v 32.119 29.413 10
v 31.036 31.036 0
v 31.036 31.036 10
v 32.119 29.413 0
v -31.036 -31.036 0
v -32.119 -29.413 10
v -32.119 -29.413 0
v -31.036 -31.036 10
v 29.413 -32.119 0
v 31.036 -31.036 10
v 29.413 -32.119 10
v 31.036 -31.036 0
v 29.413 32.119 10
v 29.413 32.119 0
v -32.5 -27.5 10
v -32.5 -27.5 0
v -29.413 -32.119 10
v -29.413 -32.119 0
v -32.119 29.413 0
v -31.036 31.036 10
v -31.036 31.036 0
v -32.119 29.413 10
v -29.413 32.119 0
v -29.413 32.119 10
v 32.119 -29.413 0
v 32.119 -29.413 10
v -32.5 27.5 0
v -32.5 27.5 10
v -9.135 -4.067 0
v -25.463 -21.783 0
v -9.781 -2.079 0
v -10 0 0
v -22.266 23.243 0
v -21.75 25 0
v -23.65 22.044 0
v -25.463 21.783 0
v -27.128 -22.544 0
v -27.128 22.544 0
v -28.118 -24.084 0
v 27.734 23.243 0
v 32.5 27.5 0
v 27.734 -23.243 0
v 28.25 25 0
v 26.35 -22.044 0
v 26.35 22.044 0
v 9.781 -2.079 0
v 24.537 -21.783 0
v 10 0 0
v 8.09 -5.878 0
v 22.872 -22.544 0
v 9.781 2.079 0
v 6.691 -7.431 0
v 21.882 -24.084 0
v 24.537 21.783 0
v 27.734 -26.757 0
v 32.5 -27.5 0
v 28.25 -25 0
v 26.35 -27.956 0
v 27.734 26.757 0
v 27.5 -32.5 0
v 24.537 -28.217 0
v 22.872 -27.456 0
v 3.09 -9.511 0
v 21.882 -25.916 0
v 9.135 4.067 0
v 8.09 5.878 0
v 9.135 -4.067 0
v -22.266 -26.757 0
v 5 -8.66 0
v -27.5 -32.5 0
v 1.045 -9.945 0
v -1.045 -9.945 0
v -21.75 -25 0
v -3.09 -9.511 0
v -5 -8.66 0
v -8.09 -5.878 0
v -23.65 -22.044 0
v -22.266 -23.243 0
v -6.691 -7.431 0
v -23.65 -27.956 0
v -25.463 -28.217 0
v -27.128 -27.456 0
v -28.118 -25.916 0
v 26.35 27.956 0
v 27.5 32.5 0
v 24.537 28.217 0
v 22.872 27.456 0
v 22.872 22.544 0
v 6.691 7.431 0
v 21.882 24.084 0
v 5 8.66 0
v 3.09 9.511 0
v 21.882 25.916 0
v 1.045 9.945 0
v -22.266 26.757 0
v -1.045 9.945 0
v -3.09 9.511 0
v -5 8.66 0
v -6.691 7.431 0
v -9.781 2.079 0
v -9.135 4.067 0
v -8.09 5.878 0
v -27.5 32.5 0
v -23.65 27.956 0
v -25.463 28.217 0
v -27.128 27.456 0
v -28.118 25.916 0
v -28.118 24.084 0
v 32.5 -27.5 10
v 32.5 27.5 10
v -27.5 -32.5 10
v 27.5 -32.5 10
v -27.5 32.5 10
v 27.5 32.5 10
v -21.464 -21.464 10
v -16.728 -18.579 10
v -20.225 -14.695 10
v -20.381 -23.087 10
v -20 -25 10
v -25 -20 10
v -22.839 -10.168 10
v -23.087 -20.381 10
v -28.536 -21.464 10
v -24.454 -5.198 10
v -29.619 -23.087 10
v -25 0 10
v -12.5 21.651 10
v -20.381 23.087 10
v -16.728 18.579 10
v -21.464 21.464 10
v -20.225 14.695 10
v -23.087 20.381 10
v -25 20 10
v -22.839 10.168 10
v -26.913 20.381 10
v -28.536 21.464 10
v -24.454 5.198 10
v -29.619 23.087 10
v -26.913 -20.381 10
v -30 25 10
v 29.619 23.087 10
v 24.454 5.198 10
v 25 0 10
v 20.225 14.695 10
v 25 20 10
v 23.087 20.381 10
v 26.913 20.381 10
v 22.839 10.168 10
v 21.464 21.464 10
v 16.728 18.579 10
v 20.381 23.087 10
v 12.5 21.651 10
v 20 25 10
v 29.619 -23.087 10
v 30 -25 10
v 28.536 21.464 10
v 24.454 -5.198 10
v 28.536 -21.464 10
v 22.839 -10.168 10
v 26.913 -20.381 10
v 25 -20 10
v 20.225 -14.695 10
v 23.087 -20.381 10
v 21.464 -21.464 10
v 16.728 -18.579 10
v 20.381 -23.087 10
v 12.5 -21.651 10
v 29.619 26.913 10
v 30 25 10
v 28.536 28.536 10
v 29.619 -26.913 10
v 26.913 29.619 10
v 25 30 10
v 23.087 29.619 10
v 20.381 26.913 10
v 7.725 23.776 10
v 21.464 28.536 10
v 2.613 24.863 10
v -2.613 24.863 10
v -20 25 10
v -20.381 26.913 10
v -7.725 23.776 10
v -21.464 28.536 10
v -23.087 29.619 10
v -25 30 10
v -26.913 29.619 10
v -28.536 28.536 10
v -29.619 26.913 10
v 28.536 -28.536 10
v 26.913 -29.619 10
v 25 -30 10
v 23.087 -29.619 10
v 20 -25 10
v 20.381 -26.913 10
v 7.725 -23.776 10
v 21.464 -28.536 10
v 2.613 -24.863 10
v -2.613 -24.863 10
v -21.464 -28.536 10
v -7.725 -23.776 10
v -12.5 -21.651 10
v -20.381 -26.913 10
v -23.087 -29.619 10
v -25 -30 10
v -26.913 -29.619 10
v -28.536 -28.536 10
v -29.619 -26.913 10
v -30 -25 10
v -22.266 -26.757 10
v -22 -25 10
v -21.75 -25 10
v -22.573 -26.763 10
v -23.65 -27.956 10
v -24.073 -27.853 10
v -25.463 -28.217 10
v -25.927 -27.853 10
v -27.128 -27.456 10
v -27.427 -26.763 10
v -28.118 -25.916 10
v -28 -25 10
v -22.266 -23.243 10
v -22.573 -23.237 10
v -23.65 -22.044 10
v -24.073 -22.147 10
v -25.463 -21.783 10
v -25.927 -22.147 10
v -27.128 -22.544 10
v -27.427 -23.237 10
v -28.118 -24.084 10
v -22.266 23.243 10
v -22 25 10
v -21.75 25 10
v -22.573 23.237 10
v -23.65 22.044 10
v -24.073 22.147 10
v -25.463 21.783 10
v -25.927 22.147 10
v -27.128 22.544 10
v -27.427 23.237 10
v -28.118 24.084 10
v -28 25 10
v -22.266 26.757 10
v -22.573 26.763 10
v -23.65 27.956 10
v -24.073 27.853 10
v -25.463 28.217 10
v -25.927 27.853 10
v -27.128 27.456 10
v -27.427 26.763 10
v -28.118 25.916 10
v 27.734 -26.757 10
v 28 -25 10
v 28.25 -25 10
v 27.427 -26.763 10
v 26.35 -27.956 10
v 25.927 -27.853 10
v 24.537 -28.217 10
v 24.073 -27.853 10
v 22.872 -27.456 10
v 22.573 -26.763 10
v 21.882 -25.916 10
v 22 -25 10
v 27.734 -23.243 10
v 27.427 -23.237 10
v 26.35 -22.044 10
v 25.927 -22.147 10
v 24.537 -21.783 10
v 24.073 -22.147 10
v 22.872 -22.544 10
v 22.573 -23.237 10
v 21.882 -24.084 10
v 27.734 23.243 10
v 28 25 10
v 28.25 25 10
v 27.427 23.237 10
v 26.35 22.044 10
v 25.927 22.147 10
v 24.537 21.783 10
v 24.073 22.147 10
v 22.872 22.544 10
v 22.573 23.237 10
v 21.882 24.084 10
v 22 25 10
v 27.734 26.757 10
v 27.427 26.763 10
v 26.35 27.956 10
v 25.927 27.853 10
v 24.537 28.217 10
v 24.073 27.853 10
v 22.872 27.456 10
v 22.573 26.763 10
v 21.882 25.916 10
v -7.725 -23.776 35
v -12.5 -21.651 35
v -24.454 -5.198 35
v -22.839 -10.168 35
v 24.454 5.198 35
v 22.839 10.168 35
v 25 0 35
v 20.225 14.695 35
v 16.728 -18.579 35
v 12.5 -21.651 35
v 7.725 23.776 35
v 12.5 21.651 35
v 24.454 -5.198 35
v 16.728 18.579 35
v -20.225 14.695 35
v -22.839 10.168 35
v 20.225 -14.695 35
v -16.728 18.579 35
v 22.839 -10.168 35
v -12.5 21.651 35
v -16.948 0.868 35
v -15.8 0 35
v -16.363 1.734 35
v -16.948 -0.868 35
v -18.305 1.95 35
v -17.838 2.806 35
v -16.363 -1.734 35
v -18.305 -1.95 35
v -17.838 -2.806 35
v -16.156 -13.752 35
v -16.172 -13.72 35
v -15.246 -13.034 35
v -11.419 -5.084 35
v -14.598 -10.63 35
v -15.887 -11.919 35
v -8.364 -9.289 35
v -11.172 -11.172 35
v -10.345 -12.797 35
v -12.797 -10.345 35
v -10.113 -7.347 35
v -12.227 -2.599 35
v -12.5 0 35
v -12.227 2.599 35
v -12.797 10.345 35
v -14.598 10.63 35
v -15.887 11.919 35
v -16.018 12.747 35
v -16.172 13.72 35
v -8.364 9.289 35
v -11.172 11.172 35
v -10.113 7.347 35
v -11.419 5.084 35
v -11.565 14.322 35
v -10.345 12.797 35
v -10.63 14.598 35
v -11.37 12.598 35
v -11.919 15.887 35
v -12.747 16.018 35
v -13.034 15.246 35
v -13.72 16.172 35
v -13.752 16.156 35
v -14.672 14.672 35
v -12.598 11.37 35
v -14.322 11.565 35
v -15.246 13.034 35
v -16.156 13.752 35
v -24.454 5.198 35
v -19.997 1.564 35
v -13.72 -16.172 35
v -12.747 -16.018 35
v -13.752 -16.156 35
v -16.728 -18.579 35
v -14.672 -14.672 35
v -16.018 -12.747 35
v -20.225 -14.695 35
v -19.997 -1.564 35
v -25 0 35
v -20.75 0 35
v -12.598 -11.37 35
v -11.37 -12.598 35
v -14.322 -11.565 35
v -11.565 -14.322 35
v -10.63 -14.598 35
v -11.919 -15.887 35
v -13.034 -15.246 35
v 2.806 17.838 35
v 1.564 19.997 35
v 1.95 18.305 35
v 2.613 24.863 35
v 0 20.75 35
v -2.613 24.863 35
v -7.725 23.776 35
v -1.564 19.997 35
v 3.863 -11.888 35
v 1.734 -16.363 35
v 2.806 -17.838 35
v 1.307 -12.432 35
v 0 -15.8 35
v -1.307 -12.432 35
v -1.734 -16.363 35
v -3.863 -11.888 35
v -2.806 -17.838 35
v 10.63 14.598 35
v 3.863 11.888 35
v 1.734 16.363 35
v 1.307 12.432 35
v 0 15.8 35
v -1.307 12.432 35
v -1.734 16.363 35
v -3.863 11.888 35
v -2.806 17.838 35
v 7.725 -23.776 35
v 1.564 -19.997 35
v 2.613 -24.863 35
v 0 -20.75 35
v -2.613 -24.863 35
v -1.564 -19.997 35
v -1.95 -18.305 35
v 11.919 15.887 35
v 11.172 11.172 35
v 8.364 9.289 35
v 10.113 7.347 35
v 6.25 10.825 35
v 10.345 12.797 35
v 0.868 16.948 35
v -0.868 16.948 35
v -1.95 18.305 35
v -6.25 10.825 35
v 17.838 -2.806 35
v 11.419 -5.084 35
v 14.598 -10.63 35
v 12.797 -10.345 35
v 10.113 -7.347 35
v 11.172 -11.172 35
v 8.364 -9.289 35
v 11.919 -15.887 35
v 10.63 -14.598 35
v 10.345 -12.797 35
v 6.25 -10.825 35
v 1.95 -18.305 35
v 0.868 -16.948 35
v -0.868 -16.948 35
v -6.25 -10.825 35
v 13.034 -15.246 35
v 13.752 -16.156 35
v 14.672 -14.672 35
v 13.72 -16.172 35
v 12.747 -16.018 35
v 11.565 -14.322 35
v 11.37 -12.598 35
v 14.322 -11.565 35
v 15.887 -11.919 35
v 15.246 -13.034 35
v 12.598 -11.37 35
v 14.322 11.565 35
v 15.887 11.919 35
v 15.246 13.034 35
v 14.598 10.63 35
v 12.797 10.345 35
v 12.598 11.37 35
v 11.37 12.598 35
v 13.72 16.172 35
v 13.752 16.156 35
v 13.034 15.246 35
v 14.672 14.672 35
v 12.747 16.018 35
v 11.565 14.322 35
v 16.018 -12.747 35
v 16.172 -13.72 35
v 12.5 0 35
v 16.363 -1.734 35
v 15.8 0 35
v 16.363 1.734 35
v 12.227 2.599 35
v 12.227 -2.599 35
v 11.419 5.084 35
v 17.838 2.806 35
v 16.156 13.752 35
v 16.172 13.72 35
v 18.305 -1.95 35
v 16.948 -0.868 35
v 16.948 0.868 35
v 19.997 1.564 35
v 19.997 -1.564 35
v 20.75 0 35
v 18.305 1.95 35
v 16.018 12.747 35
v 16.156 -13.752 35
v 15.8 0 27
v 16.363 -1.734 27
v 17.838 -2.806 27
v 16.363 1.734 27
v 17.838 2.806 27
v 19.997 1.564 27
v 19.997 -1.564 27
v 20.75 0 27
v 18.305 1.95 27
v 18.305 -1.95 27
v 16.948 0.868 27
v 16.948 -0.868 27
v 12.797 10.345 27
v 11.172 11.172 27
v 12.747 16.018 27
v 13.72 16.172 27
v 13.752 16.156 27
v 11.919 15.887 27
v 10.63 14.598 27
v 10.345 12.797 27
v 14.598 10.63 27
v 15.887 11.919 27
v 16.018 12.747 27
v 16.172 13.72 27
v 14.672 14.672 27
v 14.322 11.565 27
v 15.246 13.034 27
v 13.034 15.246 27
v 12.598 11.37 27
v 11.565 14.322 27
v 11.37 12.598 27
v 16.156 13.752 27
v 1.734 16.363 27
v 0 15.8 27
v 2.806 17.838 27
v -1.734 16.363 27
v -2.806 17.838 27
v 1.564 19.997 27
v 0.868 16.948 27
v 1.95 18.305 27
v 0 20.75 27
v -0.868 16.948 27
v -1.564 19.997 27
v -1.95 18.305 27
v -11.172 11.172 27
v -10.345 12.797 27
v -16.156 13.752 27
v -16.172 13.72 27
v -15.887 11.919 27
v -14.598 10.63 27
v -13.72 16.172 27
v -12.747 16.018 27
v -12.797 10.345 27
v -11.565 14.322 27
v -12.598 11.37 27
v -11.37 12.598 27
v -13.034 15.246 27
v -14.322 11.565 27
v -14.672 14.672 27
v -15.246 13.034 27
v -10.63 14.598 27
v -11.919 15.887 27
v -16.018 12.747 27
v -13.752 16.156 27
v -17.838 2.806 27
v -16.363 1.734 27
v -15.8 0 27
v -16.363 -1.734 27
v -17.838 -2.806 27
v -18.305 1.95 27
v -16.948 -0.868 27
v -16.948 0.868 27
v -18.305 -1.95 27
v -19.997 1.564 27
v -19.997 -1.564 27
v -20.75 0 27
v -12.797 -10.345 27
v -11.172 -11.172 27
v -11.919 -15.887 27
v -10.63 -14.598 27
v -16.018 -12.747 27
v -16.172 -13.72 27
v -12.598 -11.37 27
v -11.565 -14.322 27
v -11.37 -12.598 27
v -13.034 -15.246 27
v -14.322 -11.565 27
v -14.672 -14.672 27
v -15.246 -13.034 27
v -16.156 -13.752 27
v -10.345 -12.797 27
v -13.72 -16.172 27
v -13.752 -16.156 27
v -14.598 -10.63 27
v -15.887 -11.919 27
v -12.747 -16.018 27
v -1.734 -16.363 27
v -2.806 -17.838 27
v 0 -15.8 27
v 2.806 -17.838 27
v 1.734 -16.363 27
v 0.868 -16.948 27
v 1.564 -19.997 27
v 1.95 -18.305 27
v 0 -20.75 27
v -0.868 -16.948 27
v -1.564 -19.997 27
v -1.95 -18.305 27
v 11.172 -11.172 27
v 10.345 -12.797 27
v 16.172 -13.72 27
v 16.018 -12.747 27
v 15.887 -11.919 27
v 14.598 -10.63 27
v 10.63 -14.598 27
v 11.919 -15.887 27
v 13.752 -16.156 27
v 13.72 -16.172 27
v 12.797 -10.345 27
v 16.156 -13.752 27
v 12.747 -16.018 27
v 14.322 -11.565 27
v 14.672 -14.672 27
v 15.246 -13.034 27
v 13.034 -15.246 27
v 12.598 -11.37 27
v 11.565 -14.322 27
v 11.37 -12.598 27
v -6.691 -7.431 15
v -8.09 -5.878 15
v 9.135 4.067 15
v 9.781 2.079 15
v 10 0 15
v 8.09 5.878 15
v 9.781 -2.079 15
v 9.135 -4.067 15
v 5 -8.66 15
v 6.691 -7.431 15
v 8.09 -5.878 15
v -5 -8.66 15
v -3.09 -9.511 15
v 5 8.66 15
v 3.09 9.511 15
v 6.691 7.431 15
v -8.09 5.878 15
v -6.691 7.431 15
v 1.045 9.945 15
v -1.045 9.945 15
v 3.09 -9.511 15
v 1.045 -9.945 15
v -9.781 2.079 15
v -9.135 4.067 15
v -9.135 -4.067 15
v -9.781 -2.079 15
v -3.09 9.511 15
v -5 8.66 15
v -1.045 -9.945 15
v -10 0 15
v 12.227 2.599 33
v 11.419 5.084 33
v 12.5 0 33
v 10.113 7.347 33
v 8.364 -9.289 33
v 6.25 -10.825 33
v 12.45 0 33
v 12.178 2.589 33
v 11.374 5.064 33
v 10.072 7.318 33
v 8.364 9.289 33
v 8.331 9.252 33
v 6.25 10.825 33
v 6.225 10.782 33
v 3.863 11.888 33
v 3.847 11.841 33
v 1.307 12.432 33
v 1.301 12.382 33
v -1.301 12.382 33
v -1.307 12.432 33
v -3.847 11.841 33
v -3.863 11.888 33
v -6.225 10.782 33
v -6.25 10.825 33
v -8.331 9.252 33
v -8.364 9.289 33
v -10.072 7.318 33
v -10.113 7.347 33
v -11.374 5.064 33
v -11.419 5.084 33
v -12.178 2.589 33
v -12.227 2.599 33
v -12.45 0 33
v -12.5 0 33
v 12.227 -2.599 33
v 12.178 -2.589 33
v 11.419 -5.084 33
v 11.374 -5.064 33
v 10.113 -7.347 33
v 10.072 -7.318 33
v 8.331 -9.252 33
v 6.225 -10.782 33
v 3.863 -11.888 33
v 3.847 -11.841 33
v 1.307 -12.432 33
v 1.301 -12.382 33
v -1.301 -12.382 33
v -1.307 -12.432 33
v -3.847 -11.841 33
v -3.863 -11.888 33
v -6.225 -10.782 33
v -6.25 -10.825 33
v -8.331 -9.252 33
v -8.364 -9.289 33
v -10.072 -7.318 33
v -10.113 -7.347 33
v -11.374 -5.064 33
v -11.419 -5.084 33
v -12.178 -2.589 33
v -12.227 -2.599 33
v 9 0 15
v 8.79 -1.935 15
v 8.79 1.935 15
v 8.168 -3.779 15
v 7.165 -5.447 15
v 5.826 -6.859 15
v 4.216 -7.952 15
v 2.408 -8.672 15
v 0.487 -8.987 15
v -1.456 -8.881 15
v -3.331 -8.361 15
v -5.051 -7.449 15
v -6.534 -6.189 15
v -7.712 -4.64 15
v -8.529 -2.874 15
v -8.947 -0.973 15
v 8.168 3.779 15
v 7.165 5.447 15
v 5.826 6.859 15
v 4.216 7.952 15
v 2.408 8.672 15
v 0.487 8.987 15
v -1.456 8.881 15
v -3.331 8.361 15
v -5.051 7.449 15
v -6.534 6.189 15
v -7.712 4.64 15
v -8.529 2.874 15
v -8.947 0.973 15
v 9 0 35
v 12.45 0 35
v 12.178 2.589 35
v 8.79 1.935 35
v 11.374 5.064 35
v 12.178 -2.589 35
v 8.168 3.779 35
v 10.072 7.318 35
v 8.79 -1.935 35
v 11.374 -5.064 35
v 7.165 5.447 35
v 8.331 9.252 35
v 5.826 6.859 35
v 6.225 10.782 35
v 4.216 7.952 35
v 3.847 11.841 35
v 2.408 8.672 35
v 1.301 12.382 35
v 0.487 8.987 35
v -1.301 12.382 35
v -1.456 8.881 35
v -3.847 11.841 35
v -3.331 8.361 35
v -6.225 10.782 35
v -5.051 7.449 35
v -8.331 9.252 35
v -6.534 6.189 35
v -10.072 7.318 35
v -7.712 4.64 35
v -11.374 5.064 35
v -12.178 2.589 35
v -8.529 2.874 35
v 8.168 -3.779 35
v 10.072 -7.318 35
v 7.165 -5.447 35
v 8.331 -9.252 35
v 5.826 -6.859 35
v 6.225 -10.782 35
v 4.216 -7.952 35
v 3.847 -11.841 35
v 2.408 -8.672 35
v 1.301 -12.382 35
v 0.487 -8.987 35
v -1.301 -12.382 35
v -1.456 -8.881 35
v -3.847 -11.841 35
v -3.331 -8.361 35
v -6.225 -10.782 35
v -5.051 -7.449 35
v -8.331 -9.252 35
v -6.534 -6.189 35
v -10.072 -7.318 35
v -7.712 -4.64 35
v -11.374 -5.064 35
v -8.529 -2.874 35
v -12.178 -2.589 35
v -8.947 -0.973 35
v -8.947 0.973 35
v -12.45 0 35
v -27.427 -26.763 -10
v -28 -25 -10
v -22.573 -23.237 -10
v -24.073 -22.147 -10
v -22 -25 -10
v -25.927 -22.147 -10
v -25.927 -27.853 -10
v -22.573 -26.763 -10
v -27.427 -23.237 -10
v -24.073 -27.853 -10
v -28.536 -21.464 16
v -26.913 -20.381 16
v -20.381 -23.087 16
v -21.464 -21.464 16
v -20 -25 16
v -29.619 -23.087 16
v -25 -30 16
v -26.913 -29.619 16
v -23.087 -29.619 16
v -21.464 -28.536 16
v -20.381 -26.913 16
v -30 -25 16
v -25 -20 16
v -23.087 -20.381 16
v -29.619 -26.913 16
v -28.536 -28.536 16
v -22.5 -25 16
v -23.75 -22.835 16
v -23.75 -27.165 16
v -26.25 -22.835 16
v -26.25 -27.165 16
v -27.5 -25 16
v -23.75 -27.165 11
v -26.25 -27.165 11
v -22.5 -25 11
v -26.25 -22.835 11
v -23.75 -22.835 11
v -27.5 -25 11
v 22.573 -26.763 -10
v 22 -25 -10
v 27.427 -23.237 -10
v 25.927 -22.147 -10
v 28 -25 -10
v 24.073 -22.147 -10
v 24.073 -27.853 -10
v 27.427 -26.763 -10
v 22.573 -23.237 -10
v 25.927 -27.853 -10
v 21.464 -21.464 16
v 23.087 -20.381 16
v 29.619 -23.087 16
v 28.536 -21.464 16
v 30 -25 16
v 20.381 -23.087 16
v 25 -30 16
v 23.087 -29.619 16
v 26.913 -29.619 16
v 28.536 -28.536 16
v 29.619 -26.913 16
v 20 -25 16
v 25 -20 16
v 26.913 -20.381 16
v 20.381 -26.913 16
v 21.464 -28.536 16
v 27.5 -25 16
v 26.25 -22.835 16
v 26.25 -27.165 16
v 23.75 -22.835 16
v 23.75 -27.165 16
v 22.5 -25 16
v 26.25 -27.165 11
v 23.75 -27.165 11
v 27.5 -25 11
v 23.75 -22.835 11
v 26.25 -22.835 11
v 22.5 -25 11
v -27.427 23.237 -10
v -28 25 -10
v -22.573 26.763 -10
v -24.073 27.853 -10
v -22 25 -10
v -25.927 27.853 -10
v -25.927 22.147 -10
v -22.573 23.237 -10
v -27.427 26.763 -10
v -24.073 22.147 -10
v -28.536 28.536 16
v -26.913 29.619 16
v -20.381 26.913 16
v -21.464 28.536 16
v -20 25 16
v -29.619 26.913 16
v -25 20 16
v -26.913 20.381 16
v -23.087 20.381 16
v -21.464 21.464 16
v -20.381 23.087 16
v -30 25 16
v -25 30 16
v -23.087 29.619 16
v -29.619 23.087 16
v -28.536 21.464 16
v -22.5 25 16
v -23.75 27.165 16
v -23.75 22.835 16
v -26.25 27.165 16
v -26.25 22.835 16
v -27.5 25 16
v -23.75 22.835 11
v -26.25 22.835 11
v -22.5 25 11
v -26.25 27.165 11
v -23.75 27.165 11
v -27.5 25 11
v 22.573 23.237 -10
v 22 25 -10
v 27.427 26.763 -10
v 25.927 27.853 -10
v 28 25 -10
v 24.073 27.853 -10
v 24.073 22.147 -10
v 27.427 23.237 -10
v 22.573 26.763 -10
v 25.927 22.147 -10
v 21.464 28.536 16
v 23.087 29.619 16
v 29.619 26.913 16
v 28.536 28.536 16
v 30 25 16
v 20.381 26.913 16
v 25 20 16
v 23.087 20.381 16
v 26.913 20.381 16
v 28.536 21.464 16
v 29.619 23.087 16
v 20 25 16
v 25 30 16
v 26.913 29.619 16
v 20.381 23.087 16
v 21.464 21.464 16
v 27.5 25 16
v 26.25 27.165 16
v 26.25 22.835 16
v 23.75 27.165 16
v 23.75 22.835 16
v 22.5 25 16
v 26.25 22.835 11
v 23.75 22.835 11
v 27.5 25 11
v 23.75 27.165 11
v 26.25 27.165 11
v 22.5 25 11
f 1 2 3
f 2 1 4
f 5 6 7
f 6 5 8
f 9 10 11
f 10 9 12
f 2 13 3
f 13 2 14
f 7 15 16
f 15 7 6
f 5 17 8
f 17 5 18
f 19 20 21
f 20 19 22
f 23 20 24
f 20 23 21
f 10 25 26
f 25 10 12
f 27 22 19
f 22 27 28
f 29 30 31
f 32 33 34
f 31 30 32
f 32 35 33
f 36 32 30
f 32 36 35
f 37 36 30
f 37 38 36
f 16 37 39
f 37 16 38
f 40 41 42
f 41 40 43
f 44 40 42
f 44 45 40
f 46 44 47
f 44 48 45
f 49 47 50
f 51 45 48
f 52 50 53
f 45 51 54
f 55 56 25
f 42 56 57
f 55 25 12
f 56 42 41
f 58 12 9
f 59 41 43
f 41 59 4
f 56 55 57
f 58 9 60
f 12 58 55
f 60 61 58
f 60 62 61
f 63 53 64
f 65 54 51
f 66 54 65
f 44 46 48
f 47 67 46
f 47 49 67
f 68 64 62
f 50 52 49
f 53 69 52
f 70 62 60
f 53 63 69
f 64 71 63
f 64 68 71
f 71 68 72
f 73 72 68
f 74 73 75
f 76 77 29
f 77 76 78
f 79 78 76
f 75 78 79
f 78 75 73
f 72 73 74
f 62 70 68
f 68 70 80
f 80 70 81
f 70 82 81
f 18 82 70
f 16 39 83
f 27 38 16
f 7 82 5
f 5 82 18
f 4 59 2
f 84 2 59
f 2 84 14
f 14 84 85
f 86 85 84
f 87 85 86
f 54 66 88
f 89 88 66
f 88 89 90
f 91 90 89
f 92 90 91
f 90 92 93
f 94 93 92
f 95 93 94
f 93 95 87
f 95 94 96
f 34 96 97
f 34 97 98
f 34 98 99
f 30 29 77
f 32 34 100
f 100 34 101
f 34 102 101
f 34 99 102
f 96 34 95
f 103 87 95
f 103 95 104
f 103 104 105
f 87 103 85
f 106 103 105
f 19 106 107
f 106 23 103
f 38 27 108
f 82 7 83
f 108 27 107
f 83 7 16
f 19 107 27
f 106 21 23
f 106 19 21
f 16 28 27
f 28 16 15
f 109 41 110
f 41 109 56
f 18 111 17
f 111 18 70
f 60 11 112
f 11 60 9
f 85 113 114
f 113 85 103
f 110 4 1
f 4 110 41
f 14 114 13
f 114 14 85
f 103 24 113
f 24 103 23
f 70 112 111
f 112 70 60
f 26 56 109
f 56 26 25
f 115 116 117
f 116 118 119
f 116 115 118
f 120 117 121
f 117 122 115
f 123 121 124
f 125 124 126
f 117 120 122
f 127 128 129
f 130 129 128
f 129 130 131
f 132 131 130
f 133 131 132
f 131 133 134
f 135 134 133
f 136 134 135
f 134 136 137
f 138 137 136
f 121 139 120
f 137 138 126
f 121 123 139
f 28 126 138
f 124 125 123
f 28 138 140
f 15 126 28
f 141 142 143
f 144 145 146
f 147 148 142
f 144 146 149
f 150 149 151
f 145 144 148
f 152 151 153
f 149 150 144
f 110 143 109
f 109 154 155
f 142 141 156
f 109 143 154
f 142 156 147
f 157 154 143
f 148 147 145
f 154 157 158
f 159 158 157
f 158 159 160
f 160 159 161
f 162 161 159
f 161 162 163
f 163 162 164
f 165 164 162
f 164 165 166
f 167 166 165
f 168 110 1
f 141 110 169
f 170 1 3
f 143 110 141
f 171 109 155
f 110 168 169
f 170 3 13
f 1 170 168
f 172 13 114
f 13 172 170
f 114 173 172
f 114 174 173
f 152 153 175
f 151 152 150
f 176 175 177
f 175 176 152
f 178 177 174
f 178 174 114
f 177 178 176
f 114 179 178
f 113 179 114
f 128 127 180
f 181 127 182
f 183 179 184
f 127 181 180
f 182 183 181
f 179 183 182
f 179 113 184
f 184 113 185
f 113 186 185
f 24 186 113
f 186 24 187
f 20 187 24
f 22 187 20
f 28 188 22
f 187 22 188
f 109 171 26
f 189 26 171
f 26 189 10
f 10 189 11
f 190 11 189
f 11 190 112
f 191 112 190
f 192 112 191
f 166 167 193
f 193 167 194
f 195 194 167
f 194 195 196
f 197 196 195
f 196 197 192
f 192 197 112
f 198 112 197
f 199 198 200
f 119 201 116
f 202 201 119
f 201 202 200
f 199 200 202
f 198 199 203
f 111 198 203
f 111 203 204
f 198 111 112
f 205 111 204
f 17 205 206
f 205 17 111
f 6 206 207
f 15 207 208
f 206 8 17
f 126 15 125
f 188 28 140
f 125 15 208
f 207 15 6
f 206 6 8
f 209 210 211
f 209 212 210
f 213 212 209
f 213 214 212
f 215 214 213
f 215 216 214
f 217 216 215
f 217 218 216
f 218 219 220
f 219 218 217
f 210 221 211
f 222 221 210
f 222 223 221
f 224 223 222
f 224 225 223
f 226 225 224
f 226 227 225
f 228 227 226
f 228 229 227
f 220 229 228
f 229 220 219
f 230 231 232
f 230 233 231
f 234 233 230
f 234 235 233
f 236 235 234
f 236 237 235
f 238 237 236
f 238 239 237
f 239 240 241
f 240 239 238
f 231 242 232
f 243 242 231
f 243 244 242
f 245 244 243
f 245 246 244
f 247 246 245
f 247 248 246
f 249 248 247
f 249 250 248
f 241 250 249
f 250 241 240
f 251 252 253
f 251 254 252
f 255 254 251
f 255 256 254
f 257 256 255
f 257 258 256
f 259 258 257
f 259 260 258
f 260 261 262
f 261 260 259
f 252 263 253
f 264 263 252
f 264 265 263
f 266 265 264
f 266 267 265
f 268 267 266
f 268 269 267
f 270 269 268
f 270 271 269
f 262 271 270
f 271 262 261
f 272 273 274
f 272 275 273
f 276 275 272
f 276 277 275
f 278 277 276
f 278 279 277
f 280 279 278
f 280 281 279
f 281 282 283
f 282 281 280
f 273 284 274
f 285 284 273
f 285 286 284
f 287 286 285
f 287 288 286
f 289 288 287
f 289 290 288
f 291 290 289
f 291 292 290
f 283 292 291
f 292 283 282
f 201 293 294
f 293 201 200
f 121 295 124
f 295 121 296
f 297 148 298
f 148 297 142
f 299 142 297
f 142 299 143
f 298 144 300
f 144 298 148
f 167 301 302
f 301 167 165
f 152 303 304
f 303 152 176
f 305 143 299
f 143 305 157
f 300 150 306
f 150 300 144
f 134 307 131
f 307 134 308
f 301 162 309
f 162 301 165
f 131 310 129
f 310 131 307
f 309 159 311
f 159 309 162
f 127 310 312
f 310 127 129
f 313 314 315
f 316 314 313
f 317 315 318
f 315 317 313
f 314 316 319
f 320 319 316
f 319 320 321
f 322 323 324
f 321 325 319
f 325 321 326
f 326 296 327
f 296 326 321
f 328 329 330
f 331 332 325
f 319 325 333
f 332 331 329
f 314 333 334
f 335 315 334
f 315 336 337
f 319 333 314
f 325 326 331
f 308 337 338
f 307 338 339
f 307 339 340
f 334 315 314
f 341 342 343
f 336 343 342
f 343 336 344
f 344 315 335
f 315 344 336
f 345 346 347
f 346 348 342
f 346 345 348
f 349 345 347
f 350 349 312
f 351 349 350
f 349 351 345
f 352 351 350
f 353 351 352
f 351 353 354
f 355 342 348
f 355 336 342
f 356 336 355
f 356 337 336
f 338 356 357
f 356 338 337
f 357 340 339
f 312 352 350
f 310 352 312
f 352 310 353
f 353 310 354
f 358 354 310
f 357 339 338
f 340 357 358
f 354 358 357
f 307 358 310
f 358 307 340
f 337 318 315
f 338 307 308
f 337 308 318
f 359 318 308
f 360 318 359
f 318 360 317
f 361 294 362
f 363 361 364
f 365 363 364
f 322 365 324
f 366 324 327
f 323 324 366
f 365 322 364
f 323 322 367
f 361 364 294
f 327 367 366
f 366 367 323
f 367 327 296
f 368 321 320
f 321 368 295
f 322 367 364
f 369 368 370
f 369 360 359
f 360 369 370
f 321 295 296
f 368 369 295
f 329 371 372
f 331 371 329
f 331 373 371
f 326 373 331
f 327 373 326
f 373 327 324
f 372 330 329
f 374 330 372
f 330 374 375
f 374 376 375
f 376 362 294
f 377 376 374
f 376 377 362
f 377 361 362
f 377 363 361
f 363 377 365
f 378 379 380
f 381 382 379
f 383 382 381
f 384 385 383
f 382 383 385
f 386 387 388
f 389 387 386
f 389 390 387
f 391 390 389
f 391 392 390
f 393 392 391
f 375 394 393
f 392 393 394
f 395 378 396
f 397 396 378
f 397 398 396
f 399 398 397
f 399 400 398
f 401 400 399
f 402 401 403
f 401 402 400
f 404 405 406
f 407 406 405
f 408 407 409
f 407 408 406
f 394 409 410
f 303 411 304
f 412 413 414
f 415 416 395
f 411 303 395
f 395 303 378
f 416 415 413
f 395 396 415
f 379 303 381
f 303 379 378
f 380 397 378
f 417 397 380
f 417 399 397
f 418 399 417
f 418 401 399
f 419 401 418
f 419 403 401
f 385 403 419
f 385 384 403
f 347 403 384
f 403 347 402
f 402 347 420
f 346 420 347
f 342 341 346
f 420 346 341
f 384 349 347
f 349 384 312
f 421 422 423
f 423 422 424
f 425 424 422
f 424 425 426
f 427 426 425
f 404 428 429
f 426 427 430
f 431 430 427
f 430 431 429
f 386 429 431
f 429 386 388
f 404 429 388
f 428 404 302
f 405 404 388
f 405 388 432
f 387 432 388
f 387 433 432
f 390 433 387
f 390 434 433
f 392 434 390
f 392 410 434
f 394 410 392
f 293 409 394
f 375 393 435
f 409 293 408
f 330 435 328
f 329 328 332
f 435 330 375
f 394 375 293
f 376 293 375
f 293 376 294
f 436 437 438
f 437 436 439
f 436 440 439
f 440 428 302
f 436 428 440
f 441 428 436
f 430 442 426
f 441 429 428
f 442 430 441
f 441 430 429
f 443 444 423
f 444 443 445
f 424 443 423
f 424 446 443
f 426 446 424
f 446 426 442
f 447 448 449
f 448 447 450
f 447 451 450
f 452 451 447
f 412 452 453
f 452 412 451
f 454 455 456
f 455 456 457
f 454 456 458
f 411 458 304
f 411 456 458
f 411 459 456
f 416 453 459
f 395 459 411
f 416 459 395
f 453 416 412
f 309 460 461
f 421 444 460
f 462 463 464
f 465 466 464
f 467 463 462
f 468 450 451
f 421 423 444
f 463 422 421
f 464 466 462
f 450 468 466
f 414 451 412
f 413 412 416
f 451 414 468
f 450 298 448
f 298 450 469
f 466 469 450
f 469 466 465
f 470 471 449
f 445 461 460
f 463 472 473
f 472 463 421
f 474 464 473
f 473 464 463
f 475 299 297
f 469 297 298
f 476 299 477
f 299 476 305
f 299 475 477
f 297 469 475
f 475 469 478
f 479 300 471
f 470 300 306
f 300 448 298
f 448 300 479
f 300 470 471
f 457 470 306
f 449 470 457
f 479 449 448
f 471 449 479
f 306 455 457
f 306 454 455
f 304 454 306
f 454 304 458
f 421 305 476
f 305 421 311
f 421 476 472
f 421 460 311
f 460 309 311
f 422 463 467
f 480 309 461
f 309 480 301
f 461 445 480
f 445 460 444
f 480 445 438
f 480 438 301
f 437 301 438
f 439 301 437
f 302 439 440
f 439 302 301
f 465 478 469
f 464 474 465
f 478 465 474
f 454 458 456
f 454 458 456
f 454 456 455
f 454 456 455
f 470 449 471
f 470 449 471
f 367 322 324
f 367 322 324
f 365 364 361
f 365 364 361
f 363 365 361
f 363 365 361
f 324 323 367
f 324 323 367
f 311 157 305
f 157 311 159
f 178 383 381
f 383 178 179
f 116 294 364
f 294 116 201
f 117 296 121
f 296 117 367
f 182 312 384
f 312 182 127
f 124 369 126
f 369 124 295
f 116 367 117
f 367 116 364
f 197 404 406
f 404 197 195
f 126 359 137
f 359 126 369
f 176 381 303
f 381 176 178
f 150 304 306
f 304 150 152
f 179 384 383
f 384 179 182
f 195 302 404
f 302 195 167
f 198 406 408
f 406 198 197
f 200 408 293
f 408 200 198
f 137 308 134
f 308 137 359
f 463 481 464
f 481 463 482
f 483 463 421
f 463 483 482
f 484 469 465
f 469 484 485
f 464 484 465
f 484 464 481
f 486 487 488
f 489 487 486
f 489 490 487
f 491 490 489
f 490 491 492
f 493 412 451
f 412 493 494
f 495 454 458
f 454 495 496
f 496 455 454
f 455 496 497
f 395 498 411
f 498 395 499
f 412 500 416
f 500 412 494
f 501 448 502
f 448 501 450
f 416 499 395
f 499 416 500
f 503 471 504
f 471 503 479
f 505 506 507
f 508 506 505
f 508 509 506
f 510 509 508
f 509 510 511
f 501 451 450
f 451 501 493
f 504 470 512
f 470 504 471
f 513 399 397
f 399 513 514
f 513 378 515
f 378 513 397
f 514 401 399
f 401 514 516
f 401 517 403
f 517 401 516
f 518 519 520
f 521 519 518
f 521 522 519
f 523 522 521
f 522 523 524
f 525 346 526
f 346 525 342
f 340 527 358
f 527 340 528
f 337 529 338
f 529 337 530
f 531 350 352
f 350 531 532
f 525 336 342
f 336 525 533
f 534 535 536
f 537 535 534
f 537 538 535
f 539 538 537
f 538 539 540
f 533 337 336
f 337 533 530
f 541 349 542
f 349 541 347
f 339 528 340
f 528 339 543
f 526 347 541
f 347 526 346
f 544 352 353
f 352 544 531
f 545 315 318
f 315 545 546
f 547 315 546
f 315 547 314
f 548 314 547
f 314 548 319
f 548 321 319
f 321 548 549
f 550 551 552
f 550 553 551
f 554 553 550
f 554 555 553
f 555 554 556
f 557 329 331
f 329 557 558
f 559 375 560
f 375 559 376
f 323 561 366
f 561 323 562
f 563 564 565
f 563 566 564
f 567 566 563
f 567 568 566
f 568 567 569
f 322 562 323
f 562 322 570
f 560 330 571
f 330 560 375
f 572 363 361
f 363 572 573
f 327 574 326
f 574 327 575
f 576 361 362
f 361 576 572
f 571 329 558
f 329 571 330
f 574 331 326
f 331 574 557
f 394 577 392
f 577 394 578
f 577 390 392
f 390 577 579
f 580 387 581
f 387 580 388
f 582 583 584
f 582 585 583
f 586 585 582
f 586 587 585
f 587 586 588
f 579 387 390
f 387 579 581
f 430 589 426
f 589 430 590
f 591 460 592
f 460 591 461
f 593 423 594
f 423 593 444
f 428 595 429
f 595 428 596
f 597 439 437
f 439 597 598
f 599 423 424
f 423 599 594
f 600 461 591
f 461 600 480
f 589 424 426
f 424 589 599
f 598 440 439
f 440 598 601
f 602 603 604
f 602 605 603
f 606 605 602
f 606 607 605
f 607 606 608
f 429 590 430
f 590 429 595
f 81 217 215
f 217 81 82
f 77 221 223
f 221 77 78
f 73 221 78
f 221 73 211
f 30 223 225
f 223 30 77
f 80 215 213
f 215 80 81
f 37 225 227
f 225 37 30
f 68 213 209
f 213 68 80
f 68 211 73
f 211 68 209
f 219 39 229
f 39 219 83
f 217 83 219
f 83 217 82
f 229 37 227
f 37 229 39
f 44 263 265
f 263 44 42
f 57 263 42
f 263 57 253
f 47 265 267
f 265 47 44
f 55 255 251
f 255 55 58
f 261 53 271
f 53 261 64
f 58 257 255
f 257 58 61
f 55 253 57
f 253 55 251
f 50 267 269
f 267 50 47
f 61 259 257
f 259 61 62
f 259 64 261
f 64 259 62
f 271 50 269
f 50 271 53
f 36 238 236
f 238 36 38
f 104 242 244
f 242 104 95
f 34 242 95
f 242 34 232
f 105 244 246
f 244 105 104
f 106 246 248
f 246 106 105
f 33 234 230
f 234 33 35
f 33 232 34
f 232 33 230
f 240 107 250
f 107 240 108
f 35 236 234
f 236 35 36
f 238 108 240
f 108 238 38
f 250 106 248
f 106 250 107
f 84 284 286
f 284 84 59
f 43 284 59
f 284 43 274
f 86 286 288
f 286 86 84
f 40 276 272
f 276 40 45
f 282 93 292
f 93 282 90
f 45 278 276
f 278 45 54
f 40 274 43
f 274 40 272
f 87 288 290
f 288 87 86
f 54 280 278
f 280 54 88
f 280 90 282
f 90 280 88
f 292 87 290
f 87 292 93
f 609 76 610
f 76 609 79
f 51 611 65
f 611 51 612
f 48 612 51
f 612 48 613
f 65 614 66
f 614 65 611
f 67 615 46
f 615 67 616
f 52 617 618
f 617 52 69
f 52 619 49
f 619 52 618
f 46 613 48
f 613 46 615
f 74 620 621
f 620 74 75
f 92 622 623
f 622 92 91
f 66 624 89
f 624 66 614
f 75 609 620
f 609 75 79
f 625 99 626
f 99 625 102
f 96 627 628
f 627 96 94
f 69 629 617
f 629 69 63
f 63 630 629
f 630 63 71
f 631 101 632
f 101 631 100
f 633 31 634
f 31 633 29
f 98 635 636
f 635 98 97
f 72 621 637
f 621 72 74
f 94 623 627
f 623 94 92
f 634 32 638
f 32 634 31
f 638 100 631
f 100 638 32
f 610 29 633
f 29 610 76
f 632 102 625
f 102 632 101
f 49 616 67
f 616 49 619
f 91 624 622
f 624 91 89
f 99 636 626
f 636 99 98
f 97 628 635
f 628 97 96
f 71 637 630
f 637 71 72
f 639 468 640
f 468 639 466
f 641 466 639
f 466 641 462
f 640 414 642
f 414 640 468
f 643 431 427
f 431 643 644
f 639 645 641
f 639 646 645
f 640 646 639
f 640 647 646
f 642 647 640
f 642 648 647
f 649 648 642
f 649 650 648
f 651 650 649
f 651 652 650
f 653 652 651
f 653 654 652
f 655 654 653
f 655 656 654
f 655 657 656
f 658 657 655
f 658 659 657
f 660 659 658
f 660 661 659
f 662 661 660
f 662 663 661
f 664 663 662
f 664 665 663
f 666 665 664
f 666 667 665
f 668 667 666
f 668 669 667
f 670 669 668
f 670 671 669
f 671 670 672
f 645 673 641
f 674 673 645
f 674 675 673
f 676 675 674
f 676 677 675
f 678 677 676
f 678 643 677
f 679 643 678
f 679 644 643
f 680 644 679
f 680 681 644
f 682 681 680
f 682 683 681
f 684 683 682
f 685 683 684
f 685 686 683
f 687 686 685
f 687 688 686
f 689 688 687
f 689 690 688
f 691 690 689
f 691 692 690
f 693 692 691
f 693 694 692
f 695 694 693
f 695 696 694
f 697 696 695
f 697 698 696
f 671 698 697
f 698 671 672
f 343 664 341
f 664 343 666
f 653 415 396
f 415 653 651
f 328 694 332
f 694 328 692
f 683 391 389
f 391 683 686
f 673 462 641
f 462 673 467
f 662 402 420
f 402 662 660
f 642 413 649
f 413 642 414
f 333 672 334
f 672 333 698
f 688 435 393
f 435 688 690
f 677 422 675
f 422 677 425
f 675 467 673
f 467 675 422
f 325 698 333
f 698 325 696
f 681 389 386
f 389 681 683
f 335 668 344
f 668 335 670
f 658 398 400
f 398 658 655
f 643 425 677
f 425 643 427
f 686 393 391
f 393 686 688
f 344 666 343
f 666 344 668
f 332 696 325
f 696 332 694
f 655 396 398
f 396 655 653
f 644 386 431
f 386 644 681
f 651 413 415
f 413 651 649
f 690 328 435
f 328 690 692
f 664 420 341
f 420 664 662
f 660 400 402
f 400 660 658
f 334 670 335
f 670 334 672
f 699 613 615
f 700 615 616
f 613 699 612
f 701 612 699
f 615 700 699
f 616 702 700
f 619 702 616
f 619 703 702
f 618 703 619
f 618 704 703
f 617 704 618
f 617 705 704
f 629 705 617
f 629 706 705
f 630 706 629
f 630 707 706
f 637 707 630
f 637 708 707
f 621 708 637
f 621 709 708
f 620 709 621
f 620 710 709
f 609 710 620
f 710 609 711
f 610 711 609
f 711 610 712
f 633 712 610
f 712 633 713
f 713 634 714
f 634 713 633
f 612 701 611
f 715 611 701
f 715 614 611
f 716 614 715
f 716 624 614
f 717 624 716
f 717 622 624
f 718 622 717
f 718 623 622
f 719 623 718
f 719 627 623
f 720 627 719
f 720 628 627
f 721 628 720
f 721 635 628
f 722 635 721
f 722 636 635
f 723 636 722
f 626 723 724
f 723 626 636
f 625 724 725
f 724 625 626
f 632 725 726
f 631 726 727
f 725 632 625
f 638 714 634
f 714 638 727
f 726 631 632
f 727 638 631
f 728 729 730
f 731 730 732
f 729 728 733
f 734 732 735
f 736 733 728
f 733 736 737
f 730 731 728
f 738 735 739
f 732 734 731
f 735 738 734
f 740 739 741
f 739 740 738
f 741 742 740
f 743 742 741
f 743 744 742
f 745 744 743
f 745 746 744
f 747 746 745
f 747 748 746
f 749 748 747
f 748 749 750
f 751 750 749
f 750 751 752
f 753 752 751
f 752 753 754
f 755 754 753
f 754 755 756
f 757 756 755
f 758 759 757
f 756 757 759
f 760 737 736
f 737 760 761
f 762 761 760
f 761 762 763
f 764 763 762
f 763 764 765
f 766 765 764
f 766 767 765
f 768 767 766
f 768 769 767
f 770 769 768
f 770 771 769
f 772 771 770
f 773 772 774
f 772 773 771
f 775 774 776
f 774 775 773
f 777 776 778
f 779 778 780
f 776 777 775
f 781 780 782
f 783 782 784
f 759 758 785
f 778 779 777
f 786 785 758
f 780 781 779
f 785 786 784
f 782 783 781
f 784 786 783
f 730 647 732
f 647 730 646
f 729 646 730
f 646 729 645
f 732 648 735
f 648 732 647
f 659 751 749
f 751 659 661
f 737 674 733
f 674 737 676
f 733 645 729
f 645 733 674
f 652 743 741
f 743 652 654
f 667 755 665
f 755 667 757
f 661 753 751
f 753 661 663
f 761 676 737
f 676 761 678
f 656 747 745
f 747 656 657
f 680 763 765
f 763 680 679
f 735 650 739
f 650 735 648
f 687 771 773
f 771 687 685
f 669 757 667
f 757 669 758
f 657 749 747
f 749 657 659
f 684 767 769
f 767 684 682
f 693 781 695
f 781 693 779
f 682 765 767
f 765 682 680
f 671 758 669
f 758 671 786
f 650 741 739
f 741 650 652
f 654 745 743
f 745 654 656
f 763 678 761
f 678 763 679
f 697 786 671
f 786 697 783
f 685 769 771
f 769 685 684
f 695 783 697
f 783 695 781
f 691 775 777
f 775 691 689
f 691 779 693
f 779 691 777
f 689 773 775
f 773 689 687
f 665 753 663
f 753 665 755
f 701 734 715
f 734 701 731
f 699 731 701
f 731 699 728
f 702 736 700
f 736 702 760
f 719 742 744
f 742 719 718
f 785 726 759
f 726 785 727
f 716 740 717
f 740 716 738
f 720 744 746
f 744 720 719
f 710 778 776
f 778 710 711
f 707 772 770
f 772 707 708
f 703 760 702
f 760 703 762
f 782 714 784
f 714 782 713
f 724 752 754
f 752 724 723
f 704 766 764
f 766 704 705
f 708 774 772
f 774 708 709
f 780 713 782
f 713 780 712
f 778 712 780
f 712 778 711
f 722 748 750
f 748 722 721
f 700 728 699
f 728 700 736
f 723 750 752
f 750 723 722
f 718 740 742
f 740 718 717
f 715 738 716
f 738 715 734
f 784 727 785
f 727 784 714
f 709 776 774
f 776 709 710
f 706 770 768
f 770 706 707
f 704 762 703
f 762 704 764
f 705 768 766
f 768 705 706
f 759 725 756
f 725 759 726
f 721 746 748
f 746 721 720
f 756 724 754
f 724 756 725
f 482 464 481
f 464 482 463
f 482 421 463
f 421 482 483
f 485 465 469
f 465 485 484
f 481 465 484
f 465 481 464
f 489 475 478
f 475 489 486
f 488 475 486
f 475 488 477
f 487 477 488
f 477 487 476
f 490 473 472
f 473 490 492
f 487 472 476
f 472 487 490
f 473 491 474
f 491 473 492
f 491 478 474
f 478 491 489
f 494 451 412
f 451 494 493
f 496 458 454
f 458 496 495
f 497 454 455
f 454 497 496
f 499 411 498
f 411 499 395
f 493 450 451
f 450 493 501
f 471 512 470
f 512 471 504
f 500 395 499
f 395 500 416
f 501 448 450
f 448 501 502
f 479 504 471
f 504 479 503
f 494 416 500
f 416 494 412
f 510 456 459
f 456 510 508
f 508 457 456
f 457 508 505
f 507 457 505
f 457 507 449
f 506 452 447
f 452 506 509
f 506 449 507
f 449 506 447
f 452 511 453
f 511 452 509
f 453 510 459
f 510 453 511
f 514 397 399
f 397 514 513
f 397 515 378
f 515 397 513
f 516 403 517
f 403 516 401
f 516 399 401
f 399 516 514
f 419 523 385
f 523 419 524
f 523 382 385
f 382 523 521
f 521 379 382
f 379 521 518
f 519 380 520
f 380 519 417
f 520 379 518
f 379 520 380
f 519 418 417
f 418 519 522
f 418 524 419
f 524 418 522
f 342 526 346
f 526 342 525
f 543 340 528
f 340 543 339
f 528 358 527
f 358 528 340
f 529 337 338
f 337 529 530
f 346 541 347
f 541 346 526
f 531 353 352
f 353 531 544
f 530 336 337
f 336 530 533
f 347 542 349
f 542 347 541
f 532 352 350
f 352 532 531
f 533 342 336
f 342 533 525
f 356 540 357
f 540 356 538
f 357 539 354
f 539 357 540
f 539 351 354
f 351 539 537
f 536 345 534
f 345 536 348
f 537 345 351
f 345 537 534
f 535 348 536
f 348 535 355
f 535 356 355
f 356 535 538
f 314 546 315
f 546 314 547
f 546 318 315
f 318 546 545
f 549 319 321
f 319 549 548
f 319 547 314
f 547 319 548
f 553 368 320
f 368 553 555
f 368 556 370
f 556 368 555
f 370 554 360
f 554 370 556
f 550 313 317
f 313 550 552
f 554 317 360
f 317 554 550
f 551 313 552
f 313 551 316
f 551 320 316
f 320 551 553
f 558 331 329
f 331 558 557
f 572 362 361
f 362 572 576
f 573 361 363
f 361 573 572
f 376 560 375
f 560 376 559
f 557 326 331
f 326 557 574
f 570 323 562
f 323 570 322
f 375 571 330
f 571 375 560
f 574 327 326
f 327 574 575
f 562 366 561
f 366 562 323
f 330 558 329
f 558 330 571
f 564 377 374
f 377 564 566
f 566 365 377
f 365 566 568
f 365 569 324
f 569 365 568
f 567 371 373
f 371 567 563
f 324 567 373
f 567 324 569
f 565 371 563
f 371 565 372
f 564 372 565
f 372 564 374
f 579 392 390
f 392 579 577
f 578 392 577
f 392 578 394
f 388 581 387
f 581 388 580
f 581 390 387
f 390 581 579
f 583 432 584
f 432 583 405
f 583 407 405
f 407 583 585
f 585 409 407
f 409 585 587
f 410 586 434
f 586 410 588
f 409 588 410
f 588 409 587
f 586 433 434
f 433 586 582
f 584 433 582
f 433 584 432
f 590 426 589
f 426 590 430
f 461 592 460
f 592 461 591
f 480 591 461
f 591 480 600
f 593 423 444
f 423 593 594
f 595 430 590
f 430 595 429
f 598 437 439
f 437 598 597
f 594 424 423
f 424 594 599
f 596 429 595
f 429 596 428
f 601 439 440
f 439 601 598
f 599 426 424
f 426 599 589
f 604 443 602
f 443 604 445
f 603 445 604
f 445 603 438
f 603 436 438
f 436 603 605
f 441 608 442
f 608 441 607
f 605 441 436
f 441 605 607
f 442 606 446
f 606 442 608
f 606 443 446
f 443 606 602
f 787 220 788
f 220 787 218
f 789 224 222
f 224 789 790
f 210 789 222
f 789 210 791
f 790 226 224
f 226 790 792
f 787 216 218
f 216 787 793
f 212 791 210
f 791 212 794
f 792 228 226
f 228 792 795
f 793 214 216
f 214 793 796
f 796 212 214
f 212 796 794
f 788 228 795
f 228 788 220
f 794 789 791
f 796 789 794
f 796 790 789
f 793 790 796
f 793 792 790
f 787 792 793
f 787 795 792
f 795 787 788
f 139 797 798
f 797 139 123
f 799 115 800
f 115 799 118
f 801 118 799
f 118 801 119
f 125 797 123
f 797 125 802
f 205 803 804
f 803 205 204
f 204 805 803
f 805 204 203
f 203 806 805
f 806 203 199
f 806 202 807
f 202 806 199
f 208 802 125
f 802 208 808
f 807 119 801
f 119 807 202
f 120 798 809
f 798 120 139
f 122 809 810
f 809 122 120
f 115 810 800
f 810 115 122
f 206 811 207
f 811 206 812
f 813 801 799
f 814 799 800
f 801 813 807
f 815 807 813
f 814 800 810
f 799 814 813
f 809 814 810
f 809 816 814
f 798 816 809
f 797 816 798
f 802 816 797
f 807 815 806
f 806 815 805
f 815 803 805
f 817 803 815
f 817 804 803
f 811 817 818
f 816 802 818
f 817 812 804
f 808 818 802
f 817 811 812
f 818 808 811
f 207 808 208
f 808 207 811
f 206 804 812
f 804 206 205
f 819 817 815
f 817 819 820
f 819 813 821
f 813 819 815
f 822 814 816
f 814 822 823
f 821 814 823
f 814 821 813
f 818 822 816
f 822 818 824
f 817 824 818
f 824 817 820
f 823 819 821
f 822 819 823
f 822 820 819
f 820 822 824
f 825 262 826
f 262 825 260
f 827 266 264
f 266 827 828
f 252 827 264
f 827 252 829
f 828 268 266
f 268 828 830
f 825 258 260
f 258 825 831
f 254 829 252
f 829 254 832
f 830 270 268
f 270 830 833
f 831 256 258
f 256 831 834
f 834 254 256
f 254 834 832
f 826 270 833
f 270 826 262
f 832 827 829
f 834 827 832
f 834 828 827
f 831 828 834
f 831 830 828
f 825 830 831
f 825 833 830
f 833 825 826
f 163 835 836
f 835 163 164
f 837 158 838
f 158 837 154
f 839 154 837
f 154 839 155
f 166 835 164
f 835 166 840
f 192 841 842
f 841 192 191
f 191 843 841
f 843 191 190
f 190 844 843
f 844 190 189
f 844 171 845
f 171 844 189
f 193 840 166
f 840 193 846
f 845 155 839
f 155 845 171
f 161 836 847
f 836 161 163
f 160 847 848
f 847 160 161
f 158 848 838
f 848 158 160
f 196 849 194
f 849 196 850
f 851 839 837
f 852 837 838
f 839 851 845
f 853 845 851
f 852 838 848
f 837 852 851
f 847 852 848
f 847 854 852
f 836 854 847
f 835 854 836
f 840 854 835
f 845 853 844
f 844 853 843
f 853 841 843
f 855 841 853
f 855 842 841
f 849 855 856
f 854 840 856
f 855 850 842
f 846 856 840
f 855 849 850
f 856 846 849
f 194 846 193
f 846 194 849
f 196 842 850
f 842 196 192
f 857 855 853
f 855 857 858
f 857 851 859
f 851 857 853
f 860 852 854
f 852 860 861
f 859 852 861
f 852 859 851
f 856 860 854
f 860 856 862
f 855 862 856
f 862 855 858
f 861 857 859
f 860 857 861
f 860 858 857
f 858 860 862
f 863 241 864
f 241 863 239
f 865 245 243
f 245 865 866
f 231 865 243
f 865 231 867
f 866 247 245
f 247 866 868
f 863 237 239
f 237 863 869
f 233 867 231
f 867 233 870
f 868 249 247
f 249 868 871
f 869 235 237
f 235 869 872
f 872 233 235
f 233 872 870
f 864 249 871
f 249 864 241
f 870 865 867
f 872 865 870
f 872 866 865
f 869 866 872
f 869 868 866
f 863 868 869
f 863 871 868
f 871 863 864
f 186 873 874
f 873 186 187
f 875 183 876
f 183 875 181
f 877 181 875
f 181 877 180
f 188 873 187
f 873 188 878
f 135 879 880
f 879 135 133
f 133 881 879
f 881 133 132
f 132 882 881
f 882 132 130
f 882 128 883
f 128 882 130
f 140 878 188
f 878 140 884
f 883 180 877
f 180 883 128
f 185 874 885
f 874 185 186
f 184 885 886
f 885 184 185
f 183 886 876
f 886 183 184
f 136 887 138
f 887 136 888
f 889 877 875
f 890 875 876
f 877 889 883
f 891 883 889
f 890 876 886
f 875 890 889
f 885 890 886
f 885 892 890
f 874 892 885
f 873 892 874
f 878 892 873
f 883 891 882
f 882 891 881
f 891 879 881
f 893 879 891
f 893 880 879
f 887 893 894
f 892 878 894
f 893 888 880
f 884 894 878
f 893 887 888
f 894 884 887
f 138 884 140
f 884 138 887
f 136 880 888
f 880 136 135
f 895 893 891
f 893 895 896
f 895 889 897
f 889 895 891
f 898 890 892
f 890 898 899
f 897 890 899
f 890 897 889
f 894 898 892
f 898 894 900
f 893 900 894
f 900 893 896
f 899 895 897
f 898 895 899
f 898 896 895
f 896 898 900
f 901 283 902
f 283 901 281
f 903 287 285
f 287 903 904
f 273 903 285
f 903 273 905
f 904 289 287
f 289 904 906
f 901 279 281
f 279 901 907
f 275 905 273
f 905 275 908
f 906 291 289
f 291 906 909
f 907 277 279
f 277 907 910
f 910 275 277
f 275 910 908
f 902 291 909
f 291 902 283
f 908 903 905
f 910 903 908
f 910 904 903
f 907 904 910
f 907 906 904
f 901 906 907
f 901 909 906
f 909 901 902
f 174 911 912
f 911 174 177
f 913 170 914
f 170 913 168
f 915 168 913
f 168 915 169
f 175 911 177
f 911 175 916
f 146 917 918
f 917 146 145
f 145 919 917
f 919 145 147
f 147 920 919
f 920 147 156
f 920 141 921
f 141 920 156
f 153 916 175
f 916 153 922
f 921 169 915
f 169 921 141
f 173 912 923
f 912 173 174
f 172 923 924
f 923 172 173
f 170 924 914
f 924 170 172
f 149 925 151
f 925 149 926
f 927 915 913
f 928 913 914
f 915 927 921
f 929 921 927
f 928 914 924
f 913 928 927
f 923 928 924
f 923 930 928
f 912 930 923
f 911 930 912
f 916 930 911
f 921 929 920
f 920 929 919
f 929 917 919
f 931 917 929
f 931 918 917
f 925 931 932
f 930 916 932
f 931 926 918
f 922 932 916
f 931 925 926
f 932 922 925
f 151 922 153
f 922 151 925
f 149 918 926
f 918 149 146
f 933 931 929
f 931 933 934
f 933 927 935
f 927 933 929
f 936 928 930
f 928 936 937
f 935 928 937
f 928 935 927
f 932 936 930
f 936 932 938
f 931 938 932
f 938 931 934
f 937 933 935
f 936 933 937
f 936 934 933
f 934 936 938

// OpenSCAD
// file: M6_capscrew.scad
// M6 capscrew
shank_dia = 6.0;
head_dia = 10.0;
head_h = 6.0;
hex_dia = 5;
hex_h = 5;

module M6_capscrew(len) {
    color("grey") difference() {
        union() {
            cylinder(d=shank_dia, h=len);
            translate([0,0,len]) cylinder(d=head_dia, h=head_h);
        }
        translate([0,0,len+head_h-hex_h]) cylinder(d=hex_dia, h=hex_h,$fn=6);
    }
}
           
M6_capscrew(20);
// file: insert.scad
include <project.scad>

module insert() {
    color("gold") difference() {
        union() {
            cylinder(d=5.9, h=insert_h);
        }
        cylinder(d=4, h=insert_h+hole_eps);
    }
}

insert();
// file: housing.scad
include <project.scad>
use <helpers.scad>

module bearing_housing() {
    boss_size = [60, 60, 10];
    boss_rad = 5;
    cyl_dia = 50;
    cyl_h = 35;
    thru_dia = 20;
    cap_pcd = 37.5;
    cap_n = 8;
    M6_clearance = 6.5;
    M4_insert_h = 8;
    M4_insert_d = 5.9;
    flange_thk = 2;
    flange_dia = 25;
    
    color ("silver") difference() {
        union() {
            roundedRect(boss_size, boss_rad);
            cylinder(h=cyl_h, d=cyl_dia);
        }
        cylinder(h=housing_h,d=thru_dia);
        translate([0,0,housing_h - flange_thk]) cylinder(h=flange_thk+hole_eps, d=flange_dia);
        pcd(cap_n, cap_pcd) translate([0,0,housing_h-M4_insert_h]) cylinder(d=M4_insert_d, h=M4_insert_h+hole_eps);
        grid(boss_holes, 2, 2, center=true) cylinder(d=M6_clearance, h=boss_size.z+hole_eps);
    }
}

bearing_housing();
// file: bearing.scad
include <project.scad>

bearing_od = 20;
bearing_id = 18;
flange_d = 24.9;
flange_thk = 2;


module bearing() {
        color("blue") difference() {
            union() {
                cylinder(d=bearing_od, h=bearing_h);
                translate([0, 0, bearing_h - flange_thk]) cylinder(d=flange_d, h=flange_thk);
            }
            thru_hole() cylinder(d=bearing_id, h=bearing_h+hole_eps);
        }
}

bearing();
// file: helpers.scad
module roundedRect(size, radius)
{
    linear_extrude(height=size.z) hull() {
        // place 4 circles in the corners, with the given radius
        translate([(-size.x/2)+(radius/2), (-size.y/2)+(radius/2), 0])
          circle(r=radius);
        translate([(size.x/2)-(radius/2), (-size.y/2)+(radius/2), 0])
          circle(r=radius);
        translate([(-size.x/2)+(radius/2), (size.y/2)-(radius/2), 0])
          circle(r=radius);
        translate([(size.x/2)-(radius/2), (size.y/2)-(radius/2), 0])
          circle(r=radius);
    }
}

module pcd(n, d) 
{
    angle = 360/n;
    for (i=[0:n-1]) {
        rotate([0,0,i*angle]) translate([d/2,0,0]) children();
    }
}

module grid(size, xn, yn, center=false)
{
    xmin = center == true ?  -0.5 * size[0] : 0;
    ymin = center == true ?  -0.5 * size[1] : 0;
    x_spacing = size[0] / (xn - 1);
    y_spacing = size[1] / (yn - 1);
    for (y = [0: yn - 1]) {
        for (x = [0: xn-1]) {
            translate([xmin+x*x_spacing, ymin + y*y_spacing, 0]) children();
        }
    }
}
// file: project.scad
housing_h = 35;
bearing_h  = 20;
insert_h = 8;
insert_pcd = 37.5;

hole_eps = 0.02;
hole_start_eps = 0.01;

boss_holes = [50, 50];
boss_flange_thk = 10;

module thru_hole() {
    translate([0, 0, -hole_start_eps]) children();
}
// main file
include <project.scad>
use <helpers.scad>
use <bearing.scad>
use <housing.scad>
use <insert.scad>
use <M6_capscrew.scad>

bearing_housing();
translate([0,0, housing_h - bearing_h]) bearing();
translate([0,0, housing_h-insert_h]) pcd(8, insert_pcd) insert();
translate([0,0, boss_flange_thk-20]) grid(boss_holes, 2, 2, center=true) M6_capscrew(20);
